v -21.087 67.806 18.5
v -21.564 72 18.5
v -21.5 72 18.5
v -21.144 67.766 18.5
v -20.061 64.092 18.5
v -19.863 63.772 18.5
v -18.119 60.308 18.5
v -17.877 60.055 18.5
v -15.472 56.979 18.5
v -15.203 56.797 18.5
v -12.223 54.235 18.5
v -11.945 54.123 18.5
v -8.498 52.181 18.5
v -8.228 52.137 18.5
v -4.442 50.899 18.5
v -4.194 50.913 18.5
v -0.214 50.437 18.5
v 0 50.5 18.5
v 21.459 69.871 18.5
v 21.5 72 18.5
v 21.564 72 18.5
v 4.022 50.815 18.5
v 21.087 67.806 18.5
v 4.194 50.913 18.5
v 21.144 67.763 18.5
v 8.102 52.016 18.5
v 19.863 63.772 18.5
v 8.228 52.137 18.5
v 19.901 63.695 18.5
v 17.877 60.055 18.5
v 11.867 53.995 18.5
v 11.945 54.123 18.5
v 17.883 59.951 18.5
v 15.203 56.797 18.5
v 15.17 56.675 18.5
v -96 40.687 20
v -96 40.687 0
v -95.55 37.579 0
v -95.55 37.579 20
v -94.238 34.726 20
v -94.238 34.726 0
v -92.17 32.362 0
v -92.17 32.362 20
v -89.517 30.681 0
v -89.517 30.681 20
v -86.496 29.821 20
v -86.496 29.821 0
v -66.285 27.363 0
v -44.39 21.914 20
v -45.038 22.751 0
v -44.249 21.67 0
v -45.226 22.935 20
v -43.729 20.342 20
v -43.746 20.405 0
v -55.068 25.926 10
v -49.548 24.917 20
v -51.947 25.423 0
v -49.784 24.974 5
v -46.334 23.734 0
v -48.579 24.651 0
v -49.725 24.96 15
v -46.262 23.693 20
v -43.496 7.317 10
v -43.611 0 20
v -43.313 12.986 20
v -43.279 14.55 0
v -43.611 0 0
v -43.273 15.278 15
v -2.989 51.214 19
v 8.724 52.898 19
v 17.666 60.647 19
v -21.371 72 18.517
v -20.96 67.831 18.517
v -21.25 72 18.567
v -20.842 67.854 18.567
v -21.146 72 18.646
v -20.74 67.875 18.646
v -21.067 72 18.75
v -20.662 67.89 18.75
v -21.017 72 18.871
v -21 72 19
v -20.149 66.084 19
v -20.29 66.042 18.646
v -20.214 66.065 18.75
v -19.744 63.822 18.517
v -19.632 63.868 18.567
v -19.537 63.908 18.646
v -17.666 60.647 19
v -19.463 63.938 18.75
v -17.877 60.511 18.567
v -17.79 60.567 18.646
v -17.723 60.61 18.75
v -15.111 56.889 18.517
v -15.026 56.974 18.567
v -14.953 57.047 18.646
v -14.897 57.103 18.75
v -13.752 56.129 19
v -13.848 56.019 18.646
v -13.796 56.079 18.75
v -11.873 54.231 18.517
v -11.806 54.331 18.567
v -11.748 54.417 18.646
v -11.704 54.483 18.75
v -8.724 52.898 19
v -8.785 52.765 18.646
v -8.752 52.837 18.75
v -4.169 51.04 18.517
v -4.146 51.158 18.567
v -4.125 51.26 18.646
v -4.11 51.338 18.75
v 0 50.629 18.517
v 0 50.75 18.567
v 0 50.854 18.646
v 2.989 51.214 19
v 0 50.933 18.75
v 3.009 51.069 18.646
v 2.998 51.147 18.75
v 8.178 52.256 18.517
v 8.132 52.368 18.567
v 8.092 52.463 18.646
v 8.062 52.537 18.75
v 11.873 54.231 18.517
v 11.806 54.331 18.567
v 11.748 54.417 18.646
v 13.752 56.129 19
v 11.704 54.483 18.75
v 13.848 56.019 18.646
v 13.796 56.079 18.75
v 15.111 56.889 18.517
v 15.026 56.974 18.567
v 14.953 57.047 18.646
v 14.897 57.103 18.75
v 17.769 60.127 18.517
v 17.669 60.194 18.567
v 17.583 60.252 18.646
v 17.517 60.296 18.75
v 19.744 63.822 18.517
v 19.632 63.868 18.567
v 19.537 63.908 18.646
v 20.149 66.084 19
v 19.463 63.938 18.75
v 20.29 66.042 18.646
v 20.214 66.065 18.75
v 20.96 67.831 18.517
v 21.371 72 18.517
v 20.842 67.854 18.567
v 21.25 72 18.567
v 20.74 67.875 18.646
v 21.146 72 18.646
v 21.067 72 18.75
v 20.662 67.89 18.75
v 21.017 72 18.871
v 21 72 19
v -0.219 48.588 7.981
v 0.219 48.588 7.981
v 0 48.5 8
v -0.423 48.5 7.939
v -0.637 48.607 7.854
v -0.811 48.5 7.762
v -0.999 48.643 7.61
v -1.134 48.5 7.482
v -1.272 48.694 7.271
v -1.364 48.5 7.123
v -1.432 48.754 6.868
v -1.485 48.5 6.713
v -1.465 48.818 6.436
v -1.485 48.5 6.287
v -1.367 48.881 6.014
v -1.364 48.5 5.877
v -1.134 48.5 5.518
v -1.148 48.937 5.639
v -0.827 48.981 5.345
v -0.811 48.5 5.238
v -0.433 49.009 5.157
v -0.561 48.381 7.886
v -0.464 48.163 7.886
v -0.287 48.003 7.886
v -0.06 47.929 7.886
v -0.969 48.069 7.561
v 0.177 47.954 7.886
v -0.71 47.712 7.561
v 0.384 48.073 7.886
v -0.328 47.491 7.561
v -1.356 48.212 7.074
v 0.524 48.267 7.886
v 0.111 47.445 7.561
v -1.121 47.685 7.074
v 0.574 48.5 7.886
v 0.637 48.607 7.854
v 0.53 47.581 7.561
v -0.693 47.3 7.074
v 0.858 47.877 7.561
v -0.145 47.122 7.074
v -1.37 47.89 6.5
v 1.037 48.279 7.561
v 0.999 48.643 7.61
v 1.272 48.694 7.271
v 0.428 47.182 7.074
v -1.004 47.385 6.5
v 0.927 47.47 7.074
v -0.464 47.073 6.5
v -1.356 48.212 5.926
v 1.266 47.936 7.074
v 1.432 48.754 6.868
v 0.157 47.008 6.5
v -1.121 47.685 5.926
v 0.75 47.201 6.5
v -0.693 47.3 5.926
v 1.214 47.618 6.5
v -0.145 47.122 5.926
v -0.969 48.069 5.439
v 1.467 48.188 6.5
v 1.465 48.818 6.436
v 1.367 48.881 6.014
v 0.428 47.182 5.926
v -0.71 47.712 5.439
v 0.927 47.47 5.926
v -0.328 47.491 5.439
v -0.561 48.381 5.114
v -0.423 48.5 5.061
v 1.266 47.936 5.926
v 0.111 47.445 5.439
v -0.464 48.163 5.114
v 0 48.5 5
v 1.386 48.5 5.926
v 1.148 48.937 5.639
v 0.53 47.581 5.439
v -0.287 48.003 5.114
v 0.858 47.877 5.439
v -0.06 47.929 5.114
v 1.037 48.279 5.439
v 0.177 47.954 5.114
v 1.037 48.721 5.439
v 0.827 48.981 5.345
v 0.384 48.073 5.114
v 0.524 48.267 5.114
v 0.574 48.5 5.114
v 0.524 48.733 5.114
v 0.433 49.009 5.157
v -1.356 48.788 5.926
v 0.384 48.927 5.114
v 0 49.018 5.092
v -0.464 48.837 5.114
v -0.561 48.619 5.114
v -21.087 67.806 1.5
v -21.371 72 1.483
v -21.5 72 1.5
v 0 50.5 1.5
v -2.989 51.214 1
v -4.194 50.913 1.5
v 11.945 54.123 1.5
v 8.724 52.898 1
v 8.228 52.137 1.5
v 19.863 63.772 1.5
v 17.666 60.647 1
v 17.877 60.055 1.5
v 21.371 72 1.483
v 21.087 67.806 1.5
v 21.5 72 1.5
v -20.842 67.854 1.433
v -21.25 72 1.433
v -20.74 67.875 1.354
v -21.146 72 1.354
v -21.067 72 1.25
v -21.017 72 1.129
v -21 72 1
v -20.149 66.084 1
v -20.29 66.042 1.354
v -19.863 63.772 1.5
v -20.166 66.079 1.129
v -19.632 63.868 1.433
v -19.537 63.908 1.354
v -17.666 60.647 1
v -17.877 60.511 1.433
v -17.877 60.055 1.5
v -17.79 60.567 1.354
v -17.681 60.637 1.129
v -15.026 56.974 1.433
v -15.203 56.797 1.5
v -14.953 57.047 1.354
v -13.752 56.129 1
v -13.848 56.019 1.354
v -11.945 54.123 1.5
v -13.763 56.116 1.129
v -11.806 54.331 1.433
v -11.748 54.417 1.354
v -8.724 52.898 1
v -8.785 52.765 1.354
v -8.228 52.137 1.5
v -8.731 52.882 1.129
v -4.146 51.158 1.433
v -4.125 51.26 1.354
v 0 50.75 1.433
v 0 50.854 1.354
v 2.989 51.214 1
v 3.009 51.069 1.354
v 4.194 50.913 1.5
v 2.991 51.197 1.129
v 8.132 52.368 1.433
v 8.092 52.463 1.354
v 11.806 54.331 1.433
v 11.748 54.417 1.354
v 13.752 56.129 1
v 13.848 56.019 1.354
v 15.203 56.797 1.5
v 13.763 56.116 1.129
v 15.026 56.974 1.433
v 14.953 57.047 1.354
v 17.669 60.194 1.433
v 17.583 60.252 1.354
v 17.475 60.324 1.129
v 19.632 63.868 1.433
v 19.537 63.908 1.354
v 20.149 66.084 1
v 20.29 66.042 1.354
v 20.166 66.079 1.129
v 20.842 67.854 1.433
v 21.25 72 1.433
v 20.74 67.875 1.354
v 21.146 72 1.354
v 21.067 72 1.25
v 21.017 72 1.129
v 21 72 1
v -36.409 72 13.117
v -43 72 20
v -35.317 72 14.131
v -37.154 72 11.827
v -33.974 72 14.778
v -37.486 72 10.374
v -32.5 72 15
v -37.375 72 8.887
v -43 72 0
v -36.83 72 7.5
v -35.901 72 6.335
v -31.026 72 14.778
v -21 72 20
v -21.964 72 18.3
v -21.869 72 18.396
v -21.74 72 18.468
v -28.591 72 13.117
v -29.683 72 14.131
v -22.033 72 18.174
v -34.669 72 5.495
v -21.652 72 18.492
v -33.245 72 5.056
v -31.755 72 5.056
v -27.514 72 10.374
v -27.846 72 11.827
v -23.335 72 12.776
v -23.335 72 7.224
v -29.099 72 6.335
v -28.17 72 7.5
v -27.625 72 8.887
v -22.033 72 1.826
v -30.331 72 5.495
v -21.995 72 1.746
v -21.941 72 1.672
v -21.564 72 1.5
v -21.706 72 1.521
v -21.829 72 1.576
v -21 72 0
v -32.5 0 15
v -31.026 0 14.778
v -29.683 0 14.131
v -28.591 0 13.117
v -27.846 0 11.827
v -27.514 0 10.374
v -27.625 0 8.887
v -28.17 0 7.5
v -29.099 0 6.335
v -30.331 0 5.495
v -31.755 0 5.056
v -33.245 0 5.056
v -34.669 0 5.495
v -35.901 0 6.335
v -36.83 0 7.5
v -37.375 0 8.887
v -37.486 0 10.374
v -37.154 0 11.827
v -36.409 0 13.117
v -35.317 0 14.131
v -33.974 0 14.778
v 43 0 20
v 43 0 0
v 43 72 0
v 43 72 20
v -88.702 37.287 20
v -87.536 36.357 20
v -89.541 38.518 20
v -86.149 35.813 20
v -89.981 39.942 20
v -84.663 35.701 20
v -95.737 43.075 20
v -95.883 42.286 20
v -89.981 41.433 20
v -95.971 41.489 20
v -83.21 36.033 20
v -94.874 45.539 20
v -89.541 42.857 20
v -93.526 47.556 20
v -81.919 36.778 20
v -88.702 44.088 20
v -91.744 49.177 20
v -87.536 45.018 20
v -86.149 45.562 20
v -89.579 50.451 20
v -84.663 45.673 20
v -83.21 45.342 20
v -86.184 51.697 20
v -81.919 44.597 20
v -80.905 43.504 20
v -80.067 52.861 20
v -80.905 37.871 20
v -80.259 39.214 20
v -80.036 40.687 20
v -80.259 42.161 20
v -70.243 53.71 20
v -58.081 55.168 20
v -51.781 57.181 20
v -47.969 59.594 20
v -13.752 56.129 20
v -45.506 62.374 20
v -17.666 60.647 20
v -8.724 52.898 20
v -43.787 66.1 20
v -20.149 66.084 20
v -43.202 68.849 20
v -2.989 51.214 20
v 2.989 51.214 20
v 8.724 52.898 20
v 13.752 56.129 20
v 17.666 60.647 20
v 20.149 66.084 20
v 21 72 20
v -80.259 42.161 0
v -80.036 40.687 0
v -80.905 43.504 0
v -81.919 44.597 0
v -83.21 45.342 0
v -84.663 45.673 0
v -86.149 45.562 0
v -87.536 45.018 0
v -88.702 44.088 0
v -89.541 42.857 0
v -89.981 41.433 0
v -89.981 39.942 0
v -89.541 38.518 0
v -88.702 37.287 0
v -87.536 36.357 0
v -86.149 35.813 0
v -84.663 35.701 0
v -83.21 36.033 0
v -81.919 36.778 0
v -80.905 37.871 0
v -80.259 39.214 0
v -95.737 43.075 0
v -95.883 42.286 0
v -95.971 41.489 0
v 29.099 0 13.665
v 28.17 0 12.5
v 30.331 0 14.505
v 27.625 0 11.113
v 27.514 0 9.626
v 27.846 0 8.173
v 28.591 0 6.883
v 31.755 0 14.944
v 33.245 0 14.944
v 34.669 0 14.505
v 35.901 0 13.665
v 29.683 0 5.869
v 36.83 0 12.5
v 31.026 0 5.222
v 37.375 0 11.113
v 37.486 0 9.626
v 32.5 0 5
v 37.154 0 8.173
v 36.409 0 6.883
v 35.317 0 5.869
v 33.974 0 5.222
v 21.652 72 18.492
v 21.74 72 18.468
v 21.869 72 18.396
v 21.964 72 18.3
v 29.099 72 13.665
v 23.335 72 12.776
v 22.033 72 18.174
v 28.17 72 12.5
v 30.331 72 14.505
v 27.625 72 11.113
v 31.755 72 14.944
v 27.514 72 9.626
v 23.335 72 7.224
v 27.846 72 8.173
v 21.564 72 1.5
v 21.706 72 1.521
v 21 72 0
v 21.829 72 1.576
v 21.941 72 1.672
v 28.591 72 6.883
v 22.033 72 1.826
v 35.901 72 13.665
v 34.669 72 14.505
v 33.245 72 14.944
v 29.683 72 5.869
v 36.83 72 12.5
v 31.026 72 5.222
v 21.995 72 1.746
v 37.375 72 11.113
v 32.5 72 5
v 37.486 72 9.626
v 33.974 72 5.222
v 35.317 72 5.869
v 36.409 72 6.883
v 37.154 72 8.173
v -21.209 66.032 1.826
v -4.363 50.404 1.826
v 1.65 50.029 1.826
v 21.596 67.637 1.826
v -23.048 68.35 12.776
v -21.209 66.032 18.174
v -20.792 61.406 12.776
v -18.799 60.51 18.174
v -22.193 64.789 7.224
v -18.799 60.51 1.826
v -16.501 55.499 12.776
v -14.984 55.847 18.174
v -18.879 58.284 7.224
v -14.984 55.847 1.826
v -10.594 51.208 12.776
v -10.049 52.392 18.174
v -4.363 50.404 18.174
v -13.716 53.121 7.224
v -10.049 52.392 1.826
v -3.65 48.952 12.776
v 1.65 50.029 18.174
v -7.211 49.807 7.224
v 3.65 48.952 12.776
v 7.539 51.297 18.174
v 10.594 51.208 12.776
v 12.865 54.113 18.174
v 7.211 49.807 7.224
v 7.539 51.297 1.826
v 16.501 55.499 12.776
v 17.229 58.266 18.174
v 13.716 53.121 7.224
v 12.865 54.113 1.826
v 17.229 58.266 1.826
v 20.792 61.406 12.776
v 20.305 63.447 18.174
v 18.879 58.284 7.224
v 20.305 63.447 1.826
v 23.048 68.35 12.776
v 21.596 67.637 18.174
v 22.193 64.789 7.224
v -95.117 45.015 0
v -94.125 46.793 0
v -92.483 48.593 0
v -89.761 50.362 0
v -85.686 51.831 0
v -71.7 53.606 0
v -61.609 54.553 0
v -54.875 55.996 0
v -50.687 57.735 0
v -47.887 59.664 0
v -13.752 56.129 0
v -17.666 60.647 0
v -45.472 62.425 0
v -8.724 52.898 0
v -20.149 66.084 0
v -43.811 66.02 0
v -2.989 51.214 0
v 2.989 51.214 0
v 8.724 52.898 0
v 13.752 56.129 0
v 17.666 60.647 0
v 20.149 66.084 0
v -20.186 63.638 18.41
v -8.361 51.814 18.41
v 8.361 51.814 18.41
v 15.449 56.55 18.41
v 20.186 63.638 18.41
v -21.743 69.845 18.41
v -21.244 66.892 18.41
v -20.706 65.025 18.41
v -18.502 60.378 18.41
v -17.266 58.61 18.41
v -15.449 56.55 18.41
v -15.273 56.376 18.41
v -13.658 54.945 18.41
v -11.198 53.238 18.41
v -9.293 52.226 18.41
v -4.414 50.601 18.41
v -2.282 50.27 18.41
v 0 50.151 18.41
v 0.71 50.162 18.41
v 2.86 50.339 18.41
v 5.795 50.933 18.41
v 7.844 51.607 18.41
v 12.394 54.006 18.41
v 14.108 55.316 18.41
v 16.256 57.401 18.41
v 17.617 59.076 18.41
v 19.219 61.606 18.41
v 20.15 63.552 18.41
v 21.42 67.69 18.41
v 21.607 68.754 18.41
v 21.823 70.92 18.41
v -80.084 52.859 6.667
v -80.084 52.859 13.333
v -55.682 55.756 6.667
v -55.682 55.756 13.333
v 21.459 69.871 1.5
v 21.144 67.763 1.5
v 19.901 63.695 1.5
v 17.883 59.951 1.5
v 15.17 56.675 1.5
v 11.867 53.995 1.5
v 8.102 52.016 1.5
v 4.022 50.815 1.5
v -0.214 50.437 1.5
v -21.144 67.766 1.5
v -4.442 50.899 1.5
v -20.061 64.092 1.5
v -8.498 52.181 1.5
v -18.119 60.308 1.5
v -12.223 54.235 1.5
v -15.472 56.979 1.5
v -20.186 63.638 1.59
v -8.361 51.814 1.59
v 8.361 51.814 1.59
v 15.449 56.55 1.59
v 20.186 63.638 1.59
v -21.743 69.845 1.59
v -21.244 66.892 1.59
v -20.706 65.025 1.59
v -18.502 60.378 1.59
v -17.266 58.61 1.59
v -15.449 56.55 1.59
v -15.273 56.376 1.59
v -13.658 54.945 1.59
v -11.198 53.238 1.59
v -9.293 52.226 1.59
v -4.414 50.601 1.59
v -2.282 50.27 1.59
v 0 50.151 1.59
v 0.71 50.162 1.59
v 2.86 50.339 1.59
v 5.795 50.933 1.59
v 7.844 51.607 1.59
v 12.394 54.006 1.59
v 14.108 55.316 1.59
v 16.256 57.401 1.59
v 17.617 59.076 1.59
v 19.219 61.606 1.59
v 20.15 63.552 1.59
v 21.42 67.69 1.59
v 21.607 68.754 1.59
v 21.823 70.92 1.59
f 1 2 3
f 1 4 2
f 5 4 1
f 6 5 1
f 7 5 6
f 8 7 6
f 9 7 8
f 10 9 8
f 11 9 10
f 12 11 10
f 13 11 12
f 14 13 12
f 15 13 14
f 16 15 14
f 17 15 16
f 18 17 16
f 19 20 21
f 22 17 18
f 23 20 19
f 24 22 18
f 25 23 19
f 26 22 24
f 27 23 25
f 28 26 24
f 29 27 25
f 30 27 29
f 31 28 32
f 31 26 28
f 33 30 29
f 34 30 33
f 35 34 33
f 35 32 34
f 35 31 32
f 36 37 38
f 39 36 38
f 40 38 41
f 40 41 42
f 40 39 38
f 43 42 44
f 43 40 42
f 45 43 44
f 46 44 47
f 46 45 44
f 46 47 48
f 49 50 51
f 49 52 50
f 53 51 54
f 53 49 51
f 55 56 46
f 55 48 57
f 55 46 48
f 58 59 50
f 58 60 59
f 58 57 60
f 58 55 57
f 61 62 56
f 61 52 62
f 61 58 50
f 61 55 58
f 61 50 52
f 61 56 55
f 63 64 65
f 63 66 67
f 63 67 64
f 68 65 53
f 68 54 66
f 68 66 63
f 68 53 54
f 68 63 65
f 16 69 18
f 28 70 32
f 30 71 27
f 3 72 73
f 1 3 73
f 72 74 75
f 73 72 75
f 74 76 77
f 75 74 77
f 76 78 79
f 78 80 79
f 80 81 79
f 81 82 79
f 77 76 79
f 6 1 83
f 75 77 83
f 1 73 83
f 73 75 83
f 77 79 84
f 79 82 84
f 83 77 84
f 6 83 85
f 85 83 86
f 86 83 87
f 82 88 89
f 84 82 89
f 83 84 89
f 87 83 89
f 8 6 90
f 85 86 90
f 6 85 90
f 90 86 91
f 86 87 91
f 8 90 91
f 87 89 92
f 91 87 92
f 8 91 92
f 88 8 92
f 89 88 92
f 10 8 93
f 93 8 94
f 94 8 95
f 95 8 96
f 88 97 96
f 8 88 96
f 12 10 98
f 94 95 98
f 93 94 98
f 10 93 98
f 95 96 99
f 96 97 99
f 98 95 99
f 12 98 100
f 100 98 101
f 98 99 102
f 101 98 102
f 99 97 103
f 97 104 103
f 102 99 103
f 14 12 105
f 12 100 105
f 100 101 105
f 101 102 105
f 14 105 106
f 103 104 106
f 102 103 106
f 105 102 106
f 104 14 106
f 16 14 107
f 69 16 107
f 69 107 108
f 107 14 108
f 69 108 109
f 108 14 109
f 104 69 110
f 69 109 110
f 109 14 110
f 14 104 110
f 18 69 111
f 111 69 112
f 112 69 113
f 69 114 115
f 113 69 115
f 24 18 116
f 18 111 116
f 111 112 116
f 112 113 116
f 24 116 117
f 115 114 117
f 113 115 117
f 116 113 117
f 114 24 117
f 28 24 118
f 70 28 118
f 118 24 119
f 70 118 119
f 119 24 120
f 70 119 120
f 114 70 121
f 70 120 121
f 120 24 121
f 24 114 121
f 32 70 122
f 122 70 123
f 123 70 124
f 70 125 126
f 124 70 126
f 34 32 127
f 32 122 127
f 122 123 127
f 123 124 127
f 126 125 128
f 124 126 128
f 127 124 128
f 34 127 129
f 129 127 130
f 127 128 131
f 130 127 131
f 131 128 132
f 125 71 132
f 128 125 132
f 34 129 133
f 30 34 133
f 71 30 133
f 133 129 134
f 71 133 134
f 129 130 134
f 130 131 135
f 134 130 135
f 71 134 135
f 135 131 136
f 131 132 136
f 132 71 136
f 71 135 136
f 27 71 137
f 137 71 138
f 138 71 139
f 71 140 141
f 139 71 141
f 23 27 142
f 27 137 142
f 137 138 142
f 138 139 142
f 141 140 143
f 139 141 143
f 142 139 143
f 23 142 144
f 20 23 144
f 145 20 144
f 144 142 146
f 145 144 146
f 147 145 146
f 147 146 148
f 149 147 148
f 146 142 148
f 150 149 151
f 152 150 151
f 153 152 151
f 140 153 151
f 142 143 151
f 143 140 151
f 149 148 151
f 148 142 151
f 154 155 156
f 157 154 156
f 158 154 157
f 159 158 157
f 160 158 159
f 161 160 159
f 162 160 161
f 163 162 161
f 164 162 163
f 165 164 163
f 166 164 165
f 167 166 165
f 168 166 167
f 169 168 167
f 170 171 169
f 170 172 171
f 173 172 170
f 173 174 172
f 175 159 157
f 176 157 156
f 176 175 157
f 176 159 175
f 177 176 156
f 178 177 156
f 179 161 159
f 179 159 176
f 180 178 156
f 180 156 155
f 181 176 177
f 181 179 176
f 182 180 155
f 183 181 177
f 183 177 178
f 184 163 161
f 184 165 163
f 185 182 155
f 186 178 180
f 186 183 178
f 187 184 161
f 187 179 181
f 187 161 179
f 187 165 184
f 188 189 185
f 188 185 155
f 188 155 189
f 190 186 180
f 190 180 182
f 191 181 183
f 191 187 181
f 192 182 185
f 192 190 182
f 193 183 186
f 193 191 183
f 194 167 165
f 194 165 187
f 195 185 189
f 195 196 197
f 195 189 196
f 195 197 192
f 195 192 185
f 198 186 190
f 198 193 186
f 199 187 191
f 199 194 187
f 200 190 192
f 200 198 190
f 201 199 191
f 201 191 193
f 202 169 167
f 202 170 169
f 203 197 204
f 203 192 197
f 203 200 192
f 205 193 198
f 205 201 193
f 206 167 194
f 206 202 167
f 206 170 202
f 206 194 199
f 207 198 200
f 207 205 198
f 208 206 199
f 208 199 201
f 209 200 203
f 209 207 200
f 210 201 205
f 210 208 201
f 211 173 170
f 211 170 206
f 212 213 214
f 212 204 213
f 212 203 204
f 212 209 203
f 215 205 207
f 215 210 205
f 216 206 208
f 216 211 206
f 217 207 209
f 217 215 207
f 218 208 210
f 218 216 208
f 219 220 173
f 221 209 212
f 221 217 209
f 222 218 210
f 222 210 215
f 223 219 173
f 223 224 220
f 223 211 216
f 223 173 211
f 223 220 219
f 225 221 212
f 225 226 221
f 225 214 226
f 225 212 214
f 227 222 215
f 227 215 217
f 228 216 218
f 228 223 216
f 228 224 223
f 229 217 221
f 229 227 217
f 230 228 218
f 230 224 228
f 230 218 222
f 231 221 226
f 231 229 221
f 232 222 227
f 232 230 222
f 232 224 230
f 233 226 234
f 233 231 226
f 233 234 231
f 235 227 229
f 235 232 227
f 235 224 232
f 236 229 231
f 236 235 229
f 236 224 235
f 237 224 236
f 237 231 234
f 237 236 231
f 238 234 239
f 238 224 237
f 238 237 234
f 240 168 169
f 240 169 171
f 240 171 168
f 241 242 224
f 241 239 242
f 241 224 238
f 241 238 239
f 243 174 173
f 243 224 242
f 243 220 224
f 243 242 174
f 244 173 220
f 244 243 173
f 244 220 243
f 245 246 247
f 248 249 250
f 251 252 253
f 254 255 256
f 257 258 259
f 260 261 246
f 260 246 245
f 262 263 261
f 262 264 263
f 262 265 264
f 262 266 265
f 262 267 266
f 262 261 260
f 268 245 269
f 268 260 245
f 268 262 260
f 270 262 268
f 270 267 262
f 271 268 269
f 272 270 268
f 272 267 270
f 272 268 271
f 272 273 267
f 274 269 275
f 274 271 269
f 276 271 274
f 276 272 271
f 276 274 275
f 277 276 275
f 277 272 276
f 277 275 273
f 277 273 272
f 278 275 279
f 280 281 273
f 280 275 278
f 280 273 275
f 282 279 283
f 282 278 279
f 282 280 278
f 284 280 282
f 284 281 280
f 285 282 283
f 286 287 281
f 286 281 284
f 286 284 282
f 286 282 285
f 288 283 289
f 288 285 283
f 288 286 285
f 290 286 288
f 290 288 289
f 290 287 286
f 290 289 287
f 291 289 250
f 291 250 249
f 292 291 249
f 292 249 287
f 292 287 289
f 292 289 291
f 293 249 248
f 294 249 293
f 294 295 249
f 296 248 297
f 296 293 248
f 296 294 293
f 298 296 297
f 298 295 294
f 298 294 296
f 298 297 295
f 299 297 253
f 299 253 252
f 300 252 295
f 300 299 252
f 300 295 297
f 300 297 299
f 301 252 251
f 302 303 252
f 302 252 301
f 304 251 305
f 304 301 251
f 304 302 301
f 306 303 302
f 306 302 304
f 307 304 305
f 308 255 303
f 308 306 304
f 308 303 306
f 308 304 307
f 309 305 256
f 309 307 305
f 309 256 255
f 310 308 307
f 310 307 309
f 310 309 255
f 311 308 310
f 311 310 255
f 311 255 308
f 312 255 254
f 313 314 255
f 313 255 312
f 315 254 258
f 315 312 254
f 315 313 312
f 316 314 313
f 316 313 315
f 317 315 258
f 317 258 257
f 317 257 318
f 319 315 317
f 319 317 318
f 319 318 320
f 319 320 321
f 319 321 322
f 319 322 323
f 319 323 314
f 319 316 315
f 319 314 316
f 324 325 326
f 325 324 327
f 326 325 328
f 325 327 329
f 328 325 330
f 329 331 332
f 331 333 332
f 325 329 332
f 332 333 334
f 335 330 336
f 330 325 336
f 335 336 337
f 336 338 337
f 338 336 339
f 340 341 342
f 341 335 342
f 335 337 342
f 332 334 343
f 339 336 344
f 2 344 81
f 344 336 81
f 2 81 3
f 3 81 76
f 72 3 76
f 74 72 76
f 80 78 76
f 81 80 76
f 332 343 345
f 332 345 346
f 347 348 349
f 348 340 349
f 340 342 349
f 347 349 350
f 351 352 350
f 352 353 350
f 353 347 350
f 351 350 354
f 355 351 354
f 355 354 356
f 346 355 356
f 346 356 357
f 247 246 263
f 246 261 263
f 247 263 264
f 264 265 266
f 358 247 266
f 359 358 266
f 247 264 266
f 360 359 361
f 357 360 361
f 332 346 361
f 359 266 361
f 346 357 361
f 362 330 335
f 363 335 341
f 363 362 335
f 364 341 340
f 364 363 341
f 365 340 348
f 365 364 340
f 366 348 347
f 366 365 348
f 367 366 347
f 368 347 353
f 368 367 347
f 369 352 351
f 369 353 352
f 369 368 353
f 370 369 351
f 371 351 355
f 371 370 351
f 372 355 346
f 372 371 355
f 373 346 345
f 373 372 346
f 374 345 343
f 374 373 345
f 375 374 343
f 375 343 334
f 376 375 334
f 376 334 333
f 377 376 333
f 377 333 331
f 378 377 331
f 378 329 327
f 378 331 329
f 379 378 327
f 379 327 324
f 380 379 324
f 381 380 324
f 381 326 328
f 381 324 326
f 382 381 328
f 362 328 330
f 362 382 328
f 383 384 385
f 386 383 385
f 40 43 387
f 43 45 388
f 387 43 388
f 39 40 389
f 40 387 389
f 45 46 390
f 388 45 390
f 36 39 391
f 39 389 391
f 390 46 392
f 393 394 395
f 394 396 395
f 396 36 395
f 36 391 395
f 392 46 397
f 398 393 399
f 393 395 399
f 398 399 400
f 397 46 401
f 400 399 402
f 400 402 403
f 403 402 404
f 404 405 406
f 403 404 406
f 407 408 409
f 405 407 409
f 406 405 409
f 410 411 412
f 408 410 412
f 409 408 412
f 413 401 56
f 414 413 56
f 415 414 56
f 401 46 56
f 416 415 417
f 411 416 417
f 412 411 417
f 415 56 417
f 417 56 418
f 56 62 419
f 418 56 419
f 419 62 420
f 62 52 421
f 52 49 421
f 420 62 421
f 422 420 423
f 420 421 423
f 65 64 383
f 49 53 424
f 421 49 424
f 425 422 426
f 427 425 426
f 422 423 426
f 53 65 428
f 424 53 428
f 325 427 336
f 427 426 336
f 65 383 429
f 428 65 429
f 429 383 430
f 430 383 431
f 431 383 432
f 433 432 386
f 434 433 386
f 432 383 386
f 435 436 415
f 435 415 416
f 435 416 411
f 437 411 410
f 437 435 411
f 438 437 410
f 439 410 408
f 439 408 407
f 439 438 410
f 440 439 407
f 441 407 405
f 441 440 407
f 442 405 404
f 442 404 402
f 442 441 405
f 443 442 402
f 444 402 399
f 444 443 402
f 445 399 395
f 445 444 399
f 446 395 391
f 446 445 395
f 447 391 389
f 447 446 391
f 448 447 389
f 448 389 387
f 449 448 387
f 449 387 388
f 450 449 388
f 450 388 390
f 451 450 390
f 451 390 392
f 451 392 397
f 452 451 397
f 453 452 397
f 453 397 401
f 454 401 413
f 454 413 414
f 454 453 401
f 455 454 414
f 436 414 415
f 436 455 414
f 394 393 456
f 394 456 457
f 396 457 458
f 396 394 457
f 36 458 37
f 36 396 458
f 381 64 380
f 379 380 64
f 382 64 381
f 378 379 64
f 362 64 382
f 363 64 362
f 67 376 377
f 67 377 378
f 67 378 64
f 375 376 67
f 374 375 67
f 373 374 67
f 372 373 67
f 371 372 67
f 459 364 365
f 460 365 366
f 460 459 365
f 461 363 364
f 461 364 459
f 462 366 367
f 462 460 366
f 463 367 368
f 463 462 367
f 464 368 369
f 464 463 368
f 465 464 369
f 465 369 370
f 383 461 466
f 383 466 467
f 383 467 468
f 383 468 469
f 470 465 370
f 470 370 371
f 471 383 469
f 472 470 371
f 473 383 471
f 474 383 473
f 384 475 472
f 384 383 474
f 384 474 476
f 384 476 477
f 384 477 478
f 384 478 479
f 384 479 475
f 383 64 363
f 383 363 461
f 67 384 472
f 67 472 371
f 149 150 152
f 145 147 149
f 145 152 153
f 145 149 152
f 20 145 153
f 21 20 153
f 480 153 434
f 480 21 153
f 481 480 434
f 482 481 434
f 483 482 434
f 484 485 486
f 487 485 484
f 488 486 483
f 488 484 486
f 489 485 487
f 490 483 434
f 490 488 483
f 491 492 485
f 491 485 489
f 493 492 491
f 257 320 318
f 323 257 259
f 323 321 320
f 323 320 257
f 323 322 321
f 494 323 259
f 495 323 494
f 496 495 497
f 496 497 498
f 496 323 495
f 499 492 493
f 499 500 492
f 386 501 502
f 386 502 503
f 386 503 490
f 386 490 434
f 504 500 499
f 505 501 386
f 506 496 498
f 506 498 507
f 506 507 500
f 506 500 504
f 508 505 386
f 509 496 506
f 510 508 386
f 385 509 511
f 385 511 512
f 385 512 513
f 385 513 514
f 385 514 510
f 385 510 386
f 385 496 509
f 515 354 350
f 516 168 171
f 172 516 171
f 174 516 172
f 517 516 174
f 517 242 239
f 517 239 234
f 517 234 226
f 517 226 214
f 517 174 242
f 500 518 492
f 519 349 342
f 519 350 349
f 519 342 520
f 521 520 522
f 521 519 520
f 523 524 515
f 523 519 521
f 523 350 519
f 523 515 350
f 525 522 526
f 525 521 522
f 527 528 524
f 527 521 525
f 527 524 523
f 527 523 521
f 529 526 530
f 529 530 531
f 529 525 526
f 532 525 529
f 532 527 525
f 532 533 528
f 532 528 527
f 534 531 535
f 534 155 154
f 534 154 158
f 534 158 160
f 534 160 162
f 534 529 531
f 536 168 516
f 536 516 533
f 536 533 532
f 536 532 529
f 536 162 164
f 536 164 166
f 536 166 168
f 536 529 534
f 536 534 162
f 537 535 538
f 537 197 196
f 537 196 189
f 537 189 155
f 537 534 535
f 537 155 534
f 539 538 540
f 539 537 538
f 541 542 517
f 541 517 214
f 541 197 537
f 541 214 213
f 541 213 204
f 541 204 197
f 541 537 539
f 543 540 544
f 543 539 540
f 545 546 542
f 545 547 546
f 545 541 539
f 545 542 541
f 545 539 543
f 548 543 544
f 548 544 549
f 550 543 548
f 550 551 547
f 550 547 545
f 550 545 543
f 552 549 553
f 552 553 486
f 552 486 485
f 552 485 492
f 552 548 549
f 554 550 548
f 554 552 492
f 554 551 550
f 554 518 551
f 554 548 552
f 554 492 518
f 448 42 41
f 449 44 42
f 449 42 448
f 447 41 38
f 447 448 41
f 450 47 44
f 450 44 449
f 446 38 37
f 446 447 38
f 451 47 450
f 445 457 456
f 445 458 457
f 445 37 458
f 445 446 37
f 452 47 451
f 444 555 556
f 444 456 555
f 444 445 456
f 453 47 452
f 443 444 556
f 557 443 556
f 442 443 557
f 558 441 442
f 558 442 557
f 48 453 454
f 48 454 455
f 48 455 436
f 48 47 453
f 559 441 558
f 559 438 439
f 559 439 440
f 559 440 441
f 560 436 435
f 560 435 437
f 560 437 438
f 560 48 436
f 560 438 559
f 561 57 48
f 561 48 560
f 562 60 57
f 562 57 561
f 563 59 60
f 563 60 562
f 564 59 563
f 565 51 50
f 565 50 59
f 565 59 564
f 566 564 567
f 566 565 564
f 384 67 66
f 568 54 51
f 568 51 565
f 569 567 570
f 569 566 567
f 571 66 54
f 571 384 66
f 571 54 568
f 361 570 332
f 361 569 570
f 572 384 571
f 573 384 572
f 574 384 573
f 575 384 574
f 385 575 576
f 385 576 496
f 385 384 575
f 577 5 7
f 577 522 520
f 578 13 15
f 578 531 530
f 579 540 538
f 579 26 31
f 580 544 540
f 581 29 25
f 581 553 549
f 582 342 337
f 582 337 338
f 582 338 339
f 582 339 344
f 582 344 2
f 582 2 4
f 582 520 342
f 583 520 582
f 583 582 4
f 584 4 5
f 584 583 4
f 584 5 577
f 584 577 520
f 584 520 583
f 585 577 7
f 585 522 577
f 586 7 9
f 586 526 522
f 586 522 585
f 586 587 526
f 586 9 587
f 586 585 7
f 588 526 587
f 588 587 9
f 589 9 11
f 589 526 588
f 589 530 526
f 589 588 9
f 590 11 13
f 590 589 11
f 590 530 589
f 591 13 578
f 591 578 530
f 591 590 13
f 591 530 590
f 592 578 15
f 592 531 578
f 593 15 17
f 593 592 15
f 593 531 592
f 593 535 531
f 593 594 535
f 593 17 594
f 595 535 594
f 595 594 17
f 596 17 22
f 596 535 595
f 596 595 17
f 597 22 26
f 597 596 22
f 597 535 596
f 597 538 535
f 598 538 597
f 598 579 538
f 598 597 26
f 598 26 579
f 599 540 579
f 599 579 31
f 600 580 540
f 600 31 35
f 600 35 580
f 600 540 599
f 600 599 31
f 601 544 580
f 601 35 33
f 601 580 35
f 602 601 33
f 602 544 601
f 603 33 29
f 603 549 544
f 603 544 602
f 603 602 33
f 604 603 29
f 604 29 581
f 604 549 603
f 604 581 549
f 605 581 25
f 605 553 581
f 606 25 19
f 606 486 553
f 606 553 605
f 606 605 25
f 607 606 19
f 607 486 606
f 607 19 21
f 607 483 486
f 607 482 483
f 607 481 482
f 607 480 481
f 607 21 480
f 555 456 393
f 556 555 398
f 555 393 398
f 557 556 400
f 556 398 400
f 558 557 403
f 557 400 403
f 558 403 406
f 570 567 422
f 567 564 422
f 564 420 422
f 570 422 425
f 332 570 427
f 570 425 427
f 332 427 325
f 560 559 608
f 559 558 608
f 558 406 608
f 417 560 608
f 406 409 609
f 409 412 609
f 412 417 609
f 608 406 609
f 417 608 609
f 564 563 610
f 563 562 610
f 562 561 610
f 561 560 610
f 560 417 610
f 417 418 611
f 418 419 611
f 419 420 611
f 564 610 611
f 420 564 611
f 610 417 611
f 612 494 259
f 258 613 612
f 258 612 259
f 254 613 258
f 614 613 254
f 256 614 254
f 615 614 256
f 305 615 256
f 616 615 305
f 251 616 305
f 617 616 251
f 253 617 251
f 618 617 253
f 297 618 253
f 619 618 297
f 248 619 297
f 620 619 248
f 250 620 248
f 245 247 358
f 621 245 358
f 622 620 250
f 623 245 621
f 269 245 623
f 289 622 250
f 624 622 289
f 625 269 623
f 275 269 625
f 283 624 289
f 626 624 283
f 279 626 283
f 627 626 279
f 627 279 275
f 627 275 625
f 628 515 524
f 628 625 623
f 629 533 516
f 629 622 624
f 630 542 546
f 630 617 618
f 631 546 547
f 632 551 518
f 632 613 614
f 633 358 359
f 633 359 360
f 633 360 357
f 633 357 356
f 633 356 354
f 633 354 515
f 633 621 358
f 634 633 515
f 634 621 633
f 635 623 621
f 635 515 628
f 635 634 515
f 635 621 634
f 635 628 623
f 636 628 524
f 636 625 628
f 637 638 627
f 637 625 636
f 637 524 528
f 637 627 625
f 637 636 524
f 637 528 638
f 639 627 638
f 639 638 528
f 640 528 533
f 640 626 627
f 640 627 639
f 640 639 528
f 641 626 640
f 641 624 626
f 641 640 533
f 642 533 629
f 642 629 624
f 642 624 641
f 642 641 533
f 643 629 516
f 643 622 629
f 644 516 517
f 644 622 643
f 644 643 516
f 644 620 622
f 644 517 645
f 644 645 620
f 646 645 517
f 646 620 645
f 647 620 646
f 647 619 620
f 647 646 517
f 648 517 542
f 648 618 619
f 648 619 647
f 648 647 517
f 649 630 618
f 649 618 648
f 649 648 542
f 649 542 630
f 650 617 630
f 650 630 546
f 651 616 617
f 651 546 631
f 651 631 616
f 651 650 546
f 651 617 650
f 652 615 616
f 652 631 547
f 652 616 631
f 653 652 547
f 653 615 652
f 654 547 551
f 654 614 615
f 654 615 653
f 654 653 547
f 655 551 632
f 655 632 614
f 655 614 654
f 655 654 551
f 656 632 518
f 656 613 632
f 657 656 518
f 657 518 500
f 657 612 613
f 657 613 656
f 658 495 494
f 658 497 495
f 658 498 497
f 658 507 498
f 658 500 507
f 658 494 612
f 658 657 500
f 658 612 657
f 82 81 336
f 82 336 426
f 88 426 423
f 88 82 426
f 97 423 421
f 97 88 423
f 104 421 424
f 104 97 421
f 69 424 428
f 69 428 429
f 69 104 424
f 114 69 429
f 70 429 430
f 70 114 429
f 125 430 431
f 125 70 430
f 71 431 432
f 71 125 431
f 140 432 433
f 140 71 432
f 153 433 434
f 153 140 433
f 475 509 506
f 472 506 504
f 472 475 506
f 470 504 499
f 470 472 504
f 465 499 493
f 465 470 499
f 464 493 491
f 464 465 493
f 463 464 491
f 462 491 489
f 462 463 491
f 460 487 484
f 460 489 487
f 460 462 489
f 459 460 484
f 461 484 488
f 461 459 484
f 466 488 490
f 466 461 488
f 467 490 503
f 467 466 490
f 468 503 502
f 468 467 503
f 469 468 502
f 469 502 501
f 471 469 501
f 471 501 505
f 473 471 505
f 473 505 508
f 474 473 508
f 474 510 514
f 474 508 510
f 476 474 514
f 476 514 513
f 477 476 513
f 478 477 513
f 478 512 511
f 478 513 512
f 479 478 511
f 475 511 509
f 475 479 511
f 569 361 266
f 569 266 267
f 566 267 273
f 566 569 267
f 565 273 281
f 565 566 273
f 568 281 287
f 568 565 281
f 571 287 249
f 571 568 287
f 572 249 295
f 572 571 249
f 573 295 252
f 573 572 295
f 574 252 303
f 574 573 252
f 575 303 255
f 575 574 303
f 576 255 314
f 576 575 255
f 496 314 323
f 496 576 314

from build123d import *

# Parameters (mm, degrees)
SKETCH1_W           = 86
SKETCH1_H           = 72
BOSS_EXTRUDE1_DEPTH = 20
SKETCH2_R           = 5
CUT_EXTRUDE1_DEPTH  = 87.214847909
FILLET1_R           = 0.5
FILLET2_R           = 0.5
SKETCH6_W           = 20
SKETCH6_H           = 72
BOSS_EXTRUDE2_DEPTH = 53
CAVITY1_OUTLINE_R   = 5
CAVITY1_DEPTH       = 20
CUT_EXTRUDE2_DEPTH  = 122.65525076


# Read off the part's stored shape, not the designer's step: Cavity1
with BuildPart() as part:
    # Sketch1 → Boss-Extrude1 (new body)
    with BuildSketch(Plane.XY):
        with Locations((0, 36)):
            Rectangle(SKETCH1_W, SKETCH1_H)
    extrude(amount=BOSS_EXTRUDE1_DEPTH)

    # Sketch2 → Cut-Extrude1 (cut, through all)
    with BuildSketch(Plane(origin=(0, 0, 0), x_dir=(1, 0, 0), z_dir=(0, 1, 0))):
        with Locations(Location((-32.5, -10, 0), (0, 0, 270))):
            Circle(SKETCH2_R)
        with Locations(Location((32.5, -10, 0), (0, 0, 90))):
            Circle(SKETCH2_R)
    extrude(amount=CUT_EXTRUDE1_DEPTH, mode=Mode.SUBTRACT)

    # Sketch4 → Cut-Revolve1 (revolve, cut)
    with BuildSketch(Plane(origin=(0, 72, 0), x_dir=(-1, 0, 0), z_dir=(0, 1, 0))):
        with BuildLine():
            Line((0, 0), (0, 20))
            Line((0, 20), (21, 20))
            Line((21, 20), (21, 18.5))
            Line((21, 18.5), (21.9089023, 18.5))
            ThreePointArc((21.9089023, 18.5), (23.5, 10), (21.9089023, 1.5))
            Line((21.9089023, 1.5), (21, 1.5))
            Line((21, 1.5), (21, 0))
            Line((21, 0), (0, 0))
        make_face()
    revolve(axis=Axis((0, 72, 0), (0, 0, 1)), mode=Mode.SUBTRACT)

    # Sketch5 → Cut-Revolve2 (revolve, cut)
    with BuildSketch(Plane(origin=(0, 48.5, 0), x_dir=(1, 0, 0), z_dir=(0, 1, 0))):
        with BuildLine():
            Line((0, -5), (0, -8))
            ThreePointArc((0, -8), (-1.5, -6.5), (0, -5))
        make_face()
    revolve(axis=Axis((0, 48.5, 0), (0, 0, 1)), mode=Mode.SUBTRACT)

    # Fillet1
    fillet1_edges = [part.edges().sort_by_distance(p)[0] for p in [
        (0, 50.0910977, 18.5),
        (0, 50.0910977, 1.5),
    ]]
    fillet(fillet1_edges, radius=FILLET1_R)

    # Fillet2
    fillet2_edges = [part.edges().sort_by_distance(p)[0] for p in [
        (0, 51, 18.5),
        (0, 51, 1.5),
    ]]
    fillet(fillet2_edges, radius=FILLET2_R)

    # Sketch6 → Boss-Extrude2 (add)
    with BuildSketch(Plane(origin=(-43, 0, 0), x_dir=(0, 0, -1), z_dir=(1, 0, 0))):
        with Locations((-10, 36)):
            Rectangle(SKETCH6_W, SKETCH6_H)
    extrude(amount=-BOSS_EXTRUDE2_DEPTH)

    # Cavity1 outline → Cavity1 (cut)
    with BuildSketch(Plane.XY):
        with Locations((-85.036371952, 40.687381171)):
            Circle(CAVITY1_OUTLINE_R)
    extrude(amount=CAVITY1_DEPTH, mode=Mode.SUBTRACT)

    # Sketch8 → Cut-Extrude2 (cut, through all)
    with BuildSketch(Plane.XY.offset(20)):
        with BuildLine():
            Line((-43.611081488, 0), (-43.611081488, -5.76813428))
            Line((-43.611081488, -5.76813428), (-107.878292828, -5.76813428))
            Line((-107.878292828, -5.76813428), (-107.878292828, 57.33150687))
            Line((-107.878292828, 57.33150687), (-107.878292828, 72))
            Line((-107.878292828, 72), (-43, 72))
            add(Edge.make_bspline(
                [(-95.73694265, 43.074623662), (-91.28097288, 63.04805315), (-43, 42.337327556), (-43, 72)],
                knots=[0, 0, 0, 0, 1, 1, 1, 1], degree=3))
            ThreePointArc((-95.73694265, 43.074623662), (-95.93403723, 41.888227318), (-96, 40.687381171))
            ThreePointArc((-96, 40.687381171), (-93.288759206, 33.469400526), (-86.495984658, 29.821348283))
            add(Edge.make_bspline(
                [(-86.495984658, 29.821348283), (-76.006838116, 28.412361974), (-38.381653368, 24.579008499), (-43.611081488, 22.17214242), (-43.611081488, 0)],
                knots=[0, 0, 0, 0, 0.346709448, 1, 1, 1, 1], degree=3))
        make_face()
    extrude(amount=-CUT_EXTRUDE2_DEPTH, mode=Mode.SUBTRACT)


solid = part.part
